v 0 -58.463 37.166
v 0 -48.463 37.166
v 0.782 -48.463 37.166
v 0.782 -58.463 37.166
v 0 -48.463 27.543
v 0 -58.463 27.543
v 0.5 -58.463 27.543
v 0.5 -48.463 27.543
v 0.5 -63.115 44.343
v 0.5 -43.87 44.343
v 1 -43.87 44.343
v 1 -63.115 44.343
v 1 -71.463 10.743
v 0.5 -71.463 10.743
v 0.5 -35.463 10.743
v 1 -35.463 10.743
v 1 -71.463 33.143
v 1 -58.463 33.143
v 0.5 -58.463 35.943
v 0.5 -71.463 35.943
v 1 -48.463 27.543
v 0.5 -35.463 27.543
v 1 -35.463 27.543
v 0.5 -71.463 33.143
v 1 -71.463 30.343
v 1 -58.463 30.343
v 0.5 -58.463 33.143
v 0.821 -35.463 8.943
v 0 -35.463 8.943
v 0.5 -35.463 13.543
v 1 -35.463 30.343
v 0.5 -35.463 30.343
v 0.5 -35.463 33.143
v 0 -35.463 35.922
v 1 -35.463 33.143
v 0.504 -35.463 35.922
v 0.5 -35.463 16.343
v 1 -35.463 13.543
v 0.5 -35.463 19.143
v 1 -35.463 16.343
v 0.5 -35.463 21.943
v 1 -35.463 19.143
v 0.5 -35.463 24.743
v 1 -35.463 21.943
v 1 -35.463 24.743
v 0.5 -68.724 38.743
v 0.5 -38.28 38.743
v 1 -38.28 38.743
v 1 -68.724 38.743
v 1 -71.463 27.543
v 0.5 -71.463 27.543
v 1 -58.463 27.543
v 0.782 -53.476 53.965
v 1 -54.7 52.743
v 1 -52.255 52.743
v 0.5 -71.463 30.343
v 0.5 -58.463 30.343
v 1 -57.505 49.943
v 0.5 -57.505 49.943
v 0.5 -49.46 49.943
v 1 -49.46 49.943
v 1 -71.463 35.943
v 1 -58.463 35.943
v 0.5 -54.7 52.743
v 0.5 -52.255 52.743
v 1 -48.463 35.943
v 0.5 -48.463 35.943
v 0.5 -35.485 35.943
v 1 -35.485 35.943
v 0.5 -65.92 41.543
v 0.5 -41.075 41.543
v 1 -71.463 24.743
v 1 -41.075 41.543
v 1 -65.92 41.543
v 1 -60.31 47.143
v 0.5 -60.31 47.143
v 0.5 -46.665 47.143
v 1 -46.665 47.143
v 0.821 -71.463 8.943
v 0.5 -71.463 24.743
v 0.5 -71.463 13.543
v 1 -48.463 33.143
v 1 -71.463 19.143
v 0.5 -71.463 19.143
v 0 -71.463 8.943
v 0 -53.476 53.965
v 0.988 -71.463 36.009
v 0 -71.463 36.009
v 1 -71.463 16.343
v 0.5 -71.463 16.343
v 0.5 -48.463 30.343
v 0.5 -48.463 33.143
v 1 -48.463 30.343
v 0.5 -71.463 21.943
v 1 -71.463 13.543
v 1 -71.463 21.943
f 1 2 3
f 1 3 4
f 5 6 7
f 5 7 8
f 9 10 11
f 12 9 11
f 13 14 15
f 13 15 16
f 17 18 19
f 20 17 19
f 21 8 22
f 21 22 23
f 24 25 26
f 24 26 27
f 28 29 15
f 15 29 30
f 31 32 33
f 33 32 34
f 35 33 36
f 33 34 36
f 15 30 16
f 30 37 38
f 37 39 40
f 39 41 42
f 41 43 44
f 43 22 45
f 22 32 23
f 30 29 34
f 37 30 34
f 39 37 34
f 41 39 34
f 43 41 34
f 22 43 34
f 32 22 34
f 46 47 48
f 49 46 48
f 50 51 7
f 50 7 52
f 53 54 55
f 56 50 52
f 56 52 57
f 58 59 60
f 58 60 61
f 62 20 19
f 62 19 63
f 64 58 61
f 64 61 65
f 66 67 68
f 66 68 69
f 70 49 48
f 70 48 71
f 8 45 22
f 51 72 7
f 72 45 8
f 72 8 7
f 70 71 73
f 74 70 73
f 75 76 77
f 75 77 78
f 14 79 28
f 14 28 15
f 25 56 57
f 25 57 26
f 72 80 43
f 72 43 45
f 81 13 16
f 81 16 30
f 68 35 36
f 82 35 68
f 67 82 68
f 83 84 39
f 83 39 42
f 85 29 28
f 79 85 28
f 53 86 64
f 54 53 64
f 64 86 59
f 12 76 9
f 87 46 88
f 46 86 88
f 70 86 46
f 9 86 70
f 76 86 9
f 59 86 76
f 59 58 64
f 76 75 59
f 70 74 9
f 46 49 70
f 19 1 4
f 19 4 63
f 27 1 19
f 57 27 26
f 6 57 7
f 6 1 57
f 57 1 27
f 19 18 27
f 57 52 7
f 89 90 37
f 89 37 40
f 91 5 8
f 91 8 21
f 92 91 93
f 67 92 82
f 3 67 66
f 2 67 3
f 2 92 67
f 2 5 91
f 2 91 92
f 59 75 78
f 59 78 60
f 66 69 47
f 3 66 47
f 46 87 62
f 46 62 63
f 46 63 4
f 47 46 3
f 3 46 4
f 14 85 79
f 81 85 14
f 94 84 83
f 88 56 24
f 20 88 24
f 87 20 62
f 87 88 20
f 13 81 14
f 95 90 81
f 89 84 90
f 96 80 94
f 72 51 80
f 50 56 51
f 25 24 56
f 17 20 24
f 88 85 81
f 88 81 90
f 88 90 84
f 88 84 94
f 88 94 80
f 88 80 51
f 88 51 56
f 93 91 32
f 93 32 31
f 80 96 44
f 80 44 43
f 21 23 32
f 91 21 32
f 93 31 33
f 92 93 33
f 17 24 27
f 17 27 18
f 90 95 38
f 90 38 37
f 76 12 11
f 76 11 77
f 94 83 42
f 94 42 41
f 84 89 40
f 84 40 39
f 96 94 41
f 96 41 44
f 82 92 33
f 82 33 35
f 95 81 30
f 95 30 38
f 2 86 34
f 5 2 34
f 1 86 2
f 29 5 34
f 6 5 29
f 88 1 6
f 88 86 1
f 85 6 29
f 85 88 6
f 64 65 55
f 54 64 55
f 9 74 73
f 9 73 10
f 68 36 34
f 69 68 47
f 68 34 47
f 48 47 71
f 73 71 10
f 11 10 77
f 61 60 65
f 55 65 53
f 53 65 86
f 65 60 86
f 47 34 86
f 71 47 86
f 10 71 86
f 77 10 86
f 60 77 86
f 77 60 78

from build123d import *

# Parameters (mm, degrees)
F1_DEPTH = 0.5
F3_DEPTH = 36
F4_DEPTH = 36
F5_DEPTH = 25
F7_DEPTH = 25
F8_DEPTH = 0.223


with BuildPart() as f1:
    # F0 (on Right) → F1 (new body)
    with BuildSketch(Plane.YZ):
        Polygon((-35.463306278, 10.7429168718), (-71.463306278, 10.7429168718), (-71.463306278, 8.9429168718), (-70.463306278, 8.9429168718), (-36.463306278, 8.9429168718), (-35.463306278, 8.9429168718), align=None)
    extrude(amount=F1_DEPTH)

    # F2 (on face) → F3 (join)
    with BuildSketch(Plane.XZ.offset(71.463306278)):
        Polygon((0.5, 8.9429168718), (0.8214285714, 8.9429168718), (0.5, 10.7429168718), align=None)
    extrude(amount=-F3_DEPTH)

    # F2 (on face) → F4 (join)
    with BuildSketch(Plane.XZ.offset(71.463306278)):
        Polygon((0, 10.7429168718), (0.5, 10.7429168718), (1, 10.7429168718), (0.5, 13.5429168718), (1, 13.5429168718), (0.5, 16.3429168718), (1, 16.3429168718), (0.5, 19.1429168718), (1, 19.1429168718), (0.5, 21.9429168718), (1, 21.9429168718), (0.5, 24.7429168718), (1, 24.7429168718), (0.5, 27.5429168718), (1, 27.5429168718), (0.5, 30.3429168718), (1, 30.3429168718), (0.5, 33.1429168718), (1, 33.1429168718), (0.5, 35.9429168718), (1, 35.9429168718), (0.5, 38.7429168718), (1, 38.7429168718), (0.5, 41.5429168718), (1, 41.5429168718), (0.5, 44.3429168718), (1, 44.3429168718), (0.5, 47.1429168718), (1, 47.1429168718), (0.5, 49.9429168718), (1, 49.9429168718), (0.5, 52.7429168718), (1, 52.7429168718), (0.6579817238, 54.6582192183), (0.5, 54.6582192183), (0, 54.6582192183), align=None)
    extrude(amount=-F4_DEPTH)

    # F0 (on Right) → F5 (cut)
    with BuildSketch(Plane.YZ):
        Polygon((-58.463306278, 36.9429168718), (-58.463306278, 35.9429168718), (-58.463306278, 33.1429168718), (-58.463306278, 30.3429168718), (-58.463306278, 27.5429168718), (-48.463306278, 27.5429168718), (-48.463306278, 30.3429168718), (-48.463306278, 33.1429168718), (-48.463306278, 35.9429168718), (-48.463306278, 36.9429168718), (-57.463306278, 36.9429168718), align=None)
    extrude(amount=F5_DEPTH, mode=Mode.SUBTRACT)

    # F6 (on face) → F7 (cut)
    with BuildSketch(Plane(origin=(0, 0, 0), x_dir=(0, -1, 0), z_dir=(-1, 0, 0))):
        Polygon((35.463306278, 54.6582192183), (35.463306278, 35.9216630459), (53.4756928682, 53.9652556181), (71.463306278, 36.0087513756), (71.463306278, 54.6582192183), align=None)
    extrude(amount=-F7_DEPTH, mode=Mode.SUBTRACT)

    # F8 (cut): a face of the model
    f8_faces = [f1.faces().sort_by_distance(p)[0] for p in [
        (0.4107142857, -53.463306278, 36.9429168718),
    ]]
    extrude(f8_faces, amount=-F8_DEPTH, mode=Mode.SUBTRACT)


solid = f1.part
